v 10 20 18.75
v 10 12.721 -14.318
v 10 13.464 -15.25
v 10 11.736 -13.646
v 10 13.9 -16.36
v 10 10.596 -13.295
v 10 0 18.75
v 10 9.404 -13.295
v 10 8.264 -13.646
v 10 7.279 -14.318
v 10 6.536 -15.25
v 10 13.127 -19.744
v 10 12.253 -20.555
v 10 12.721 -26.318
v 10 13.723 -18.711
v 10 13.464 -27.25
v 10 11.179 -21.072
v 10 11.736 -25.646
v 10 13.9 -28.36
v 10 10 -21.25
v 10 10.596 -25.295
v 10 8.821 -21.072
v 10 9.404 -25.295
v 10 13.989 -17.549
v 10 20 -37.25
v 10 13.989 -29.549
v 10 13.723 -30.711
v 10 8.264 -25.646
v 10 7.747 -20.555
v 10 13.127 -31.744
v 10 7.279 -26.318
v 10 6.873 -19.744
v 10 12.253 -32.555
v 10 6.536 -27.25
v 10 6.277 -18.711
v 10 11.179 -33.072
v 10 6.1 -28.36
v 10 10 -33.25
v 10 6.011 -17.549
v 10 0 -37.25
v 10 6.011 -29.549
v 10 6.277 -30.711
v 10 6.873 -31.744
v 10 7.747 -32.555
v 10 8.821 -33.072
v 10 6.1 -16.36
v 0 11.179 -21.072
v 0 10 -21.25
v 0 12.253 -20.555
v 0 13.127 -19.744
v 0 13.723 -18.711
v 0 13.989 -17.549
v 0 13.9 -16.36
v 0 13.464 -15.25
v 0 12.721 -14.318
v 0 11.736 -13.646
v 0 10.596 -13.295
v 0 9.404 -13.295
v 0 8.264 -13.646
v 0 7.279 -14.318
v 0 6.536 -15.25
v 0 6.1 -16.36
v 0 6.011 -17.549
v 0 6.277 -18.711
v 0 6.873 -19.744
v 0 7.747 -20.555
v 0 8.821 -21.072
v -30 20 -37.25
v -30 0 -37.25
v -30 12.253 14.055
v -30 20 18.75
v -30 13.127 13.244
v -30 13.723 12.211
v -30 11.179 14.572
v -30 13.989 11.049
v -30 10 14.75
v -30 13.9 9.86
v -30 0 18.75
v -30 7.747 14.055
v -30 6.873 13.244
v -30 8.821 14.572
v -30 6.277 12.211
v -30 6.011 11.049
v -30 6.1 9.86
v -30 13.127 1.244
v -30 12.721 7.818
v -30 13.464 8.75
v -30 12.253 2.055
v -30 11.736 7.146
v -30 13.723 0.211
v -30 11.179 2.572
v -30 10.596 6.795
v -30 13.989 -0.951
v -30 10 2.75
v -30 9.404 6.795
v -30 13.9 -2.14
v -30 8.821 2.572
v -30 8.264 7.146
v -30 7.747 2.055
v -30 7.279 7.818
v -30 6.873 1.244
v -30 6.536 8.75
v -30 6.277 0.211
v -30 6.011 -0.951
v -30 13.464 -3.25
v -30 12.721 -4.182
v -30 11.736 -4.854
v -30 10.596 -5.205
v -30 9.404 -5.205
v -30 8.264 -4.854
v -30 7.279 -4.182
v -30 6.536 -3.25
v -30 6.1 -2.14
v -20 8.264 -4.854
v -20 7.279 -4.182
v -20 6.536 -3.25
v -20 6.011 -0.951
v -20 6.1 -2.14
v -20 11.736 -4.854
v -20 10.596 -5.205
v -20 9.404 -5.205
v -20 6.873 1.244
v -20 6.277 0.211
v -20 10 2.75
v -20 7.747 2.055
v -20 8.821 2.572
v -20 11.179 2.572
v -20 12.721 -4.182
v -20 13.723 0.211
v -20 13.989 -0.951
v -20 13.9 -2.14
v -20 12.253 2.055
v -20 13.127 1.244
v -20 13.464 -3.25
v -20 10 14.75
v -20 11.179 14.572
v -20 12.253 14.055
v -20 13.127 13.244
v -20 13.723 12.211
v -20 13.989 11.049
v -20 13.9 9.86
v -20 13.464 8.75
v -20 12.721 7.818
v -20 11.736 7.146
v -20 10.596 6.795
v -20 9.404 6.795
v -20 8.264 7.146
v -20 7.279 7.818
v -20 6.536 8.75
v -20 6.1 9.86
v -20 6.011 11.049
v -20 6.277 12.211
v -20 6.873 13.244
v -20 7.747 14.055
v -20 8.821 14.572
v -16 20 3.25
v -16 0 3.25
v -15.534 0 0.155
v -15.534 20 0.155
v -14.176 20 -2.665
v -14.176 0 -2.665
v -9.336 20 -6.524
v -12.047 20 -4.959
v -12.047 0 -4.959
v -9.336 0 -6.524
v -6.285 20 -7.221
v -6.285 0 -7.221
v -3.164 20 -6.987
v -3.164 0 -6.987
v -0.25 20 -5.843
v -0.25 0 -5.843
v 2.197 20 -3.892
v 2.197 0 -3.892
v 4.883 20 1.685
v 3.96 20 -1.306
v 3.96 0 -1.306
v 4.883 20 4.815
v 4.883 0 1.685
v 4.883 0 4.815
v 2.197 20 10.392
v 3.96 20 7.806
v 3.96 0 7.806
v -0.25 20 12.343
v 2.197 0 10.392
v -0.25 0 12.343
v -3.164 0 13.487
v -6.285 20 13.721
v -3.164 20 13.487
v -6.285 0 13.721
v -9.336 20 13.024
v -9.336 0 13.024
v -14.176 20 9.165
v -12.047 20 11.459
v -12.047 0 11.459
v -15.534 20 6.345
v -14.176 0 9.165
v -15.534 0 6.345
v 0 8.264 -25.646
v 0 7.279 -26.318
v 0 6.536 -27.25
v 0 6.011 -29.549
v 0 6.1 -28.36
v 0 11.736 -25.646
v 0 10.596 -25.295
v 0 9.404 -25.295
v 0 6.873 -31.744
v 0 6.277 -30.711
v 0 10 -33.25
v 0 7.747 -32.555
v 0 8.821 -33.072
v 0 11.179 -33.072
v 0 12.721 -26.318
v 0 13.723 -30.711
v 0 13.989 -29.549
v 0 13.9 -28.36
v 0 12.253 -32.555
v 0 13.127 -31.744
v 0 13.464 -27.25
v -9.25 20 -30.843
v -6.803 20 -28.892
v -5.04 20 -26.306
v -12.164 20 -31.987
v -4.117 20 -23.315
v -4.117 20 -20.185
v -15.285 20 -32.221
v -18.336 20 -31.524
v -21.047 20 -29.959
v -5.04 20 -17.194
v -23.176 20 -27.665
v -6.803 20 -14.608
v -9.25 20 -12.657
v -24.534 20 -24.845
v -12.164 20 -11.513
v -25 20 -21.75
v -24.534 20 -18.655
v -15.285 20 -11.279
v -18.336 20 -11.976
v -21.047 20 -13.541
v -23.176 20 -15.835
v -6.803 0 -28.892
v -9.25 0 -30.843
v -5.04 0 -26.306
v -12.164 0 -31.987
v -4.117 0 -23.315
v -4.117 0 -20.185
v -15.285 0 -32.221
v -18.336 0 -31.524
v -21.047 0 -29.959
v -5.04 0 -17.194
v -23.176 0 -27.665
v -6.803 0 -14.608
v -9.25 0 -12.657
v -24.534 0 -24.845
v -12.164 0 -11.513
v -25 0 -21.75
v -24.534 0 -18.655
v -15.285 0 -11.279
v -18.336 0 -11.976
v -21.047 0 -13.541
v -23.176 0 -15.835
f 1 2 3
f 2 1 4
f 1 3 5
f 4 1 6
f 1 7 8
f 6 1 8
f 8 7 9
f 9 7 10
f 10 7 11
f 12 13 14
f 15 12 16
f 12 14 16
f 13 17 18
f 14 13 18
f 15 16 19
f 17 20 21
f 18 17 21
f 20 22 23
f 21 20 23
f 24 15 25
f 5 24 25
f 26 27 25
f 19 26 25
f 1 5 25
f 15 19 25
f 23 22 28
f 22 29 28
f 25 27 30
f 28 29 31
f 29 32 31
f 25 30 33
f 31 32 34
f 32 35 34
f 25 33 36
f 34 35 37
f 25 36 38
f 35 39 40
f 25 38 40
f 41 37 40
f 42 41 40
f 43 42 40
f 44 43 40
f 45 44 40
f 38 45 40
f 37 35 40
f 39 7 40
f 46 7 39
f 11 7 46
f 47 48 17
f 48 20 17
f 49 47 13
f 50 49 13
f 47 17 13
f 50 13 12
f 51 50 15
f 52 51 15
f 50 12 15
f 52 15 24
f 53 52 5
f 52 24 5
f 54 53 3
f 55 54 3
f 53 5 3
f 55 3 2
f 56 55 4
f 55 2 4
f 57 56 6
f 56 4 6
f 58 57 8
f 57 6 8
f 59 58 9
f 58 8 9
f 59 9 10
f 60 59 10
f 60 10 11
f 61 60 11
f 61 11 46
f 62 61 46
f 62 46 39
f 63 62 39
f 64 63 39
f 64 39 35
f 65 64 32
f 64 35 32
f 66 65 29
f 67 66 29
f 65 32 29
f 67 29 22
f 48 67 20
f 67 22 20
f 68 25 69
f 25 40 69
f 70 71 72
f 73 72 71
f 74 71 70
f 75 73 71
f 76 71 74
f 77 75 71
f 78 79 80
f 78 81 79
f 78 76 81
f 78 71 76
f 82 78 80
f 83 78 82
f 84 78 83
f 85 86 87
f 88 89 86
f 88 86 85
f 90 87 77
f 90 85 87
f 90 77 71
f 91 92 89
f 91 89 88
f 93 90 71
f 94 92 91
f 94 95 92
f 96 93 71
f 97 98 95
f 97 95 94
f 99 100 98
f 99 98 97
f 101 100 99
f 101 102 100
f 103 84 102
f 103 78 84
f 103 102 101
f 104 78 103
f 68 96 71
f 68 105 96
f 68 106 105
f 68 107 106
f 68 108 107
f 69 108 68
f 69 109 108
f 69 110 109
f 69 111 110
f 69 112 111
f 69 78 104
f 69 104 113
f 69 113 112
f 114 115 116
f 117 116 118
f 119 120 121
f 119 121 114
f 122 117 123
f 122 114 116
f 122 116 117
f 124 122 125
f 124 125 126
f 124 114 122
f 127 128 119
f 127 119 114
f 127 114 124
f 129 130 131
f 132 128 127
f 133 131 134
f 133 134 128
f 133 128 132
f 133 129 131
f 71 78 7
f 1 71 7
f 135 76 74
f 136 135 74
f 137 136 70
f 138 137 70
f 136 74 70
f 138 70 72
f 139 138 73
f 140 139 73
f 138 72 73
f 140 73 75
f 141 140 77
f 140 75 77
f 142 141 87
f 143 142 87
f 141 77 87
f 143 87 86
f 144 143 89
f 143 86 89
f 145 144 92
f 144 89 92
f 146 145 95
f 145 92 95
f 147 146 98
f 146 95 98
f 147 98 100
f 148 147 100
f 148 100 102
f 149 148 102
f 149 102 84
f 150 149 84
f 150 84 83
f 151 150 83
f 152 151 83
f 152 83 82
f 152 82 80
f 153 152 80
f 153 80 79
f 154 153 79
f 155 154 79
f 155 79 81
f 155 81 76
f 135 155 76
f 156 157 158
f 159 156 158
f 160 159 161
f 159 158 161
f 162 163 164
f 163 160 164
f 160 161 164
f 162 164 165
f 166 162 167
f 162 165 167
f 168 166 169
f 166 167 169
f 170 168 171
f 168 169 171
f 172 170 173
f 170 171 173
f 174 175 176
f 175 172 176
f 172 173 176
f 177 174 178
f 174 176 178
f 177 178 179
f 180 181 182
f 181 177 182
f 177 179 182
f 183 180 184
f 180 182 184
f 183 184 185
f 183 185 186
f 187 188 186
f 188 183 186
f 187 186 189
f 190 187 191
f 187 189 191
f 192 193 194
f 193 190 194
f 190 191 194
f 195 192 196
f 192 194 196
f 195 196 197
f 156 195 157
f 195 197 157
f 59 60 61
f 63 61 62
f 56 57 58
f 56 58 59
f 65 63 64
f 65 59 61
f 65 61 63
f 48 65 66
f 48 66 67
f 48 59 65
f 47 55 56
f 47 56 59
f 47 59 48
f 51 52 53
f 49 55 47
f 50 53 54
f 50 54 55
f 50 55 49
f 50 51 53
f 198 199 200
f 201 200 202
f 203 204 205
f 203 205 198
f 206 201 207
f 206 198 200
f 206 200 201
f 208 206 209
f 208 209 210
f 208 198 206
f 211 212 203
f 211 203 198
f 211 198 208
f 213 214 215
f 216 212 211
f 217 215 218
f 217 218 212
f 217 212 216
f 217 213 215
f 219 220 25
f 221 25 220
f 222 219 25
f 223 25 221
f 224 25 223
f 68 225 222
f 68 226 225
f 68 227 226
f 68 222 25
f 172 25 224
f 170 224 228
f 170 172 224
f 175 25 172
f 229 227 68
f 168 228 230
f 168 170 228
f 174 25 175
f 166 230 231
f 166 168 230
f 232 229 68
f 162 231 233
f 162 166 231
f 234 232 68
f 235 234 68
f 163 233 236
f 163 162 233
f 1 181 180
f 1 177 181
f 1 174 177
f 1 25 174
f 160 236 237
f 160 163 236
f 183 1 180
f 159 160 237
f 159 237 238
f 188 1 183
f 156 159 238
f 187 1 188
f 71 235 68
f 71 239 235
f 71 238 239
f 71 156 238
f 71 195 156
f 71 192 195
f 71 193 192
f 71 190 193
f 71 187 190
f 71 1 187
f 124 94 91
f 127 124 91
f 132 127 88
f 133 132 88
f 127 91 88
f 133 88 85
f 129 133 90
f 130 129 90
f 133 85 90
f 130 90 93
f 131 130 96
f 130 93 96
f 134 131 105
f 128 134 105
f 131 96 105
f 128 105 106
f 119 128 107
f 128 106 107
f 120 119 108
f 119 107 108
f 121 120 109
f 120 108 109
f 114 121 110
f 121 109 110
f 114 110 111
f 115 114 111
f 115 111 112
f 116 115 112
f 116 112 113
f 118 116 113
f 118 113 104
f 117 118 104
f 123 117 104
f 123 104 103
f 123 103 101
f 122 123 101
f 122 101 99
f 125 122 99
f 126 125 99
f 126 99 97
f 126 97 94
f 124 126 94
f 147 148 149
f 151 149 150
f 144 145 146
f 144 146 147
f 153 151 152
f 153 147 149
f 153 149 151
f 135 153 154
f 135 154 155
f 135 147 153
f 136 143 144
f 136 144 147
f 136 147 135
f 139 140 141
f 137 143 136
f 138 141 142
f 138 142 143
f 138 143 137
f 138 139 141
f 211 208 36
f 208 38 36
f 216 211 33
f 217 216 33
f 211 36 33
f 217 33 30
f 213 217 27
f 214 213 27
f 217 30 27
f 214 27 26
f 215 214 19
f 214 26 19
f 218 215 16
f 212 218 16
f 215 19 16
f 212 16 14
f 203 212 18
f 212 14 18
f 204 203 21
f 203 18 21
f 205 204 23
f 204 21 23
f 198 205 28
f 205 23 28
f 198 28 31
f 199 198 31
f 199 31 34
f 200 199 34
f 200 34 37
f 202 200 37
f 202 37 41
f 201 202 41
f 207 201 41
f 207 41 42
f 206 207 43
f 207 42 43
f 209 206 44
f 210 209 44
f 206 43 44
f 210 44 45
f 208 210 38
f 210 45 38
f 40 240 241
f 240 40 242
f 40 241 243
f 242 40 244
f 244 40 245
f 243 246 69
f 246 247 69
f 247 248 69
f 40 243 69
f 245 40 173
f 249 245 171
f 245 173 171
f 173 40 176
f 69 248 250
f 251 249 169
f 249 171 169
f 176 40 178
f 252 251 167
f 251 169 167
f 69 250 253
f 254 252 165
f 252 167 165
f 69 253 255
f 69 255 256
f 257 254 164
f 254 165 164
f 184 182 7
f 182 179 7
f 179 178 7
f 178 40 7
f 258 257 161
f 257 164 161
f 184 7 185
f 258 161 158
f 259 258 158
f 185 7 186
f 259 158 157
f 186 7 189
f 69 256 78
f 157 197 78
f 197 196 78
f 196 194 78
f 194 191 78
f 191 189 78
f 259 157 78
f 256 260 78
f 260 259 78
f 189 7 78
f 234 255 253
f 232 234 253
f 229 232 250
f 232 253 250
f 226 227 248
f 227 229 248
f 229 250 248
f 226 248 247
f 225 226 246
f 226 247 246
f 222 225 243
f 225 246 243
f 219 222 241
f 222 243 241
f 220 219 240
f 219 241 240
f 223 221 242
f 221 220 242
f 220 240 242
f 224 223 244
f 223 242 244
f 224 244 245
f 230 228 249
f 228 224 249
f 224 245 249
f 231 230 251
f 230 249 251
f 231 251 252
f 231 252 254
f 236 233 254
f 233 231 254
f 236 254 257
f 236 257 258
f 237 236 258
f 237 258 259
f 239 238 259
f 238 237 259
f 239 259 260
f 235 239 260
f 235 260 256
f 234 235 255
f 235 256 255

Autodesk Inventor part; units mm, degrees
ref_plane "YZ Plane" through (0, 0, 0) normal (1, 0, 0) x (0, 1, 0)
ref_plane "XZ Plane" through (0, 0, 0) normal (0, 1, 0) x (-1, 0, 0)
ref_plane "XY Plane" through (0, 0, 0) normal (0, 0, 1) x (1, 0, 0)
sketch "Sketch1" plane through (0, 0, 0) normal (0, 1, 0) x (-1, 0, 0)
  line L0 (30, 18.75) -> (-10, 18.75)
  line L1 (30, 18.75) -> (30, -37.25)
  line L2 (-10, 18.75) -> (-10, -37.25)
  line L3 (-10, -37.25) -> (30, -37.25)
  circle A0 centre (5.5, 3.25) radius 10.5
  circle A1 centre (14.5, -21.75) radius 10.5
  point P0 (0, 0)
  dimension "szerokosc_jakas" = 40
  dimension "dlugosc_docisku" = 56
  dimension "srendica_walka" = 21
  dimension "odsuniecie_walka" = 15.5
  dimension "d4" = 15.5
  dimension "d5" = 21
  dimension "przesuniecie_wzgledne_walkow" = 9
  dimension "d7" = 25
extrude "Extrusion1" add sketch "Sketch1" along normal blind 20
sketch "Sketch2" plane through (10, 0, 18.75) normal (1, 0, 0) x (0, 0, -1)
  circle A0 centre (48, 10) radius 4
  line L0 (56, 0) -> (56, 20) projected
  line L1 (0, 20) -> (56, 20) construction
  circle A1 centre (36, 10) radius 4
  line L2 (69, 10) -> (-3, 10) construction
  point P0 (18.75, 0)
  dimension "d10" = 8
  dimension "d11" = 8
  dimension "d15" = 12
  dimension "d25" = 10
extrude "Extrusion2" cut sketch "Sketch2" against normal blind 10
sketch "Sketch3" plane through (-30, 0, -37.25) normal (-1, 0, 0) x (0, 0, 1)
  circle A0 centre (48, 10) radius 4
  circle A1 centre (36, 10) radius 4
  line L0 (56, 0) -> (56, 20) projected
  line L1 (0, 0) -> (56, 0) projected
  line L2 (75, 10) -> (-12, 10) construction
  point P0 (37.25, 0)
  dimension "d18" = 8
  dimension "d19" = 8
  dimension "d21" = 8
  dimension "d22" = 12
  dimension "d24" = 10
extrude "Extrusion3" cut sketch "Sketch3" against normal blind 10
equation "\"szerokosc_jakas\" = szerokosc"
equation "\"dlugosc_docisku\" = dlugosc"
equation "\"srendica_walka\" = srednica_walka"
equation "\"d4\" = -0.5 * przesuniecie_wzgledne_walkow + 0.5 * szerokosc_jakas"
equation "\"d5\" = srednica_walka"
equation "\"d25\" = 0.5 * grubosc"
equation "\"gw\" = glebokosc_gwintu"
equation "\"d24\" = 0.5 * grubosc"
equation "\"d26\" = glebokosc_gwintu"
equation "\"glebokosc_gwintu\" = 10"
equation "\"szerokosc\" = 40"
equation "\"dlugosc\" = 56"
equation "\"srednica_walka\" = 21"
equation "\"grubosc\" = 20"
